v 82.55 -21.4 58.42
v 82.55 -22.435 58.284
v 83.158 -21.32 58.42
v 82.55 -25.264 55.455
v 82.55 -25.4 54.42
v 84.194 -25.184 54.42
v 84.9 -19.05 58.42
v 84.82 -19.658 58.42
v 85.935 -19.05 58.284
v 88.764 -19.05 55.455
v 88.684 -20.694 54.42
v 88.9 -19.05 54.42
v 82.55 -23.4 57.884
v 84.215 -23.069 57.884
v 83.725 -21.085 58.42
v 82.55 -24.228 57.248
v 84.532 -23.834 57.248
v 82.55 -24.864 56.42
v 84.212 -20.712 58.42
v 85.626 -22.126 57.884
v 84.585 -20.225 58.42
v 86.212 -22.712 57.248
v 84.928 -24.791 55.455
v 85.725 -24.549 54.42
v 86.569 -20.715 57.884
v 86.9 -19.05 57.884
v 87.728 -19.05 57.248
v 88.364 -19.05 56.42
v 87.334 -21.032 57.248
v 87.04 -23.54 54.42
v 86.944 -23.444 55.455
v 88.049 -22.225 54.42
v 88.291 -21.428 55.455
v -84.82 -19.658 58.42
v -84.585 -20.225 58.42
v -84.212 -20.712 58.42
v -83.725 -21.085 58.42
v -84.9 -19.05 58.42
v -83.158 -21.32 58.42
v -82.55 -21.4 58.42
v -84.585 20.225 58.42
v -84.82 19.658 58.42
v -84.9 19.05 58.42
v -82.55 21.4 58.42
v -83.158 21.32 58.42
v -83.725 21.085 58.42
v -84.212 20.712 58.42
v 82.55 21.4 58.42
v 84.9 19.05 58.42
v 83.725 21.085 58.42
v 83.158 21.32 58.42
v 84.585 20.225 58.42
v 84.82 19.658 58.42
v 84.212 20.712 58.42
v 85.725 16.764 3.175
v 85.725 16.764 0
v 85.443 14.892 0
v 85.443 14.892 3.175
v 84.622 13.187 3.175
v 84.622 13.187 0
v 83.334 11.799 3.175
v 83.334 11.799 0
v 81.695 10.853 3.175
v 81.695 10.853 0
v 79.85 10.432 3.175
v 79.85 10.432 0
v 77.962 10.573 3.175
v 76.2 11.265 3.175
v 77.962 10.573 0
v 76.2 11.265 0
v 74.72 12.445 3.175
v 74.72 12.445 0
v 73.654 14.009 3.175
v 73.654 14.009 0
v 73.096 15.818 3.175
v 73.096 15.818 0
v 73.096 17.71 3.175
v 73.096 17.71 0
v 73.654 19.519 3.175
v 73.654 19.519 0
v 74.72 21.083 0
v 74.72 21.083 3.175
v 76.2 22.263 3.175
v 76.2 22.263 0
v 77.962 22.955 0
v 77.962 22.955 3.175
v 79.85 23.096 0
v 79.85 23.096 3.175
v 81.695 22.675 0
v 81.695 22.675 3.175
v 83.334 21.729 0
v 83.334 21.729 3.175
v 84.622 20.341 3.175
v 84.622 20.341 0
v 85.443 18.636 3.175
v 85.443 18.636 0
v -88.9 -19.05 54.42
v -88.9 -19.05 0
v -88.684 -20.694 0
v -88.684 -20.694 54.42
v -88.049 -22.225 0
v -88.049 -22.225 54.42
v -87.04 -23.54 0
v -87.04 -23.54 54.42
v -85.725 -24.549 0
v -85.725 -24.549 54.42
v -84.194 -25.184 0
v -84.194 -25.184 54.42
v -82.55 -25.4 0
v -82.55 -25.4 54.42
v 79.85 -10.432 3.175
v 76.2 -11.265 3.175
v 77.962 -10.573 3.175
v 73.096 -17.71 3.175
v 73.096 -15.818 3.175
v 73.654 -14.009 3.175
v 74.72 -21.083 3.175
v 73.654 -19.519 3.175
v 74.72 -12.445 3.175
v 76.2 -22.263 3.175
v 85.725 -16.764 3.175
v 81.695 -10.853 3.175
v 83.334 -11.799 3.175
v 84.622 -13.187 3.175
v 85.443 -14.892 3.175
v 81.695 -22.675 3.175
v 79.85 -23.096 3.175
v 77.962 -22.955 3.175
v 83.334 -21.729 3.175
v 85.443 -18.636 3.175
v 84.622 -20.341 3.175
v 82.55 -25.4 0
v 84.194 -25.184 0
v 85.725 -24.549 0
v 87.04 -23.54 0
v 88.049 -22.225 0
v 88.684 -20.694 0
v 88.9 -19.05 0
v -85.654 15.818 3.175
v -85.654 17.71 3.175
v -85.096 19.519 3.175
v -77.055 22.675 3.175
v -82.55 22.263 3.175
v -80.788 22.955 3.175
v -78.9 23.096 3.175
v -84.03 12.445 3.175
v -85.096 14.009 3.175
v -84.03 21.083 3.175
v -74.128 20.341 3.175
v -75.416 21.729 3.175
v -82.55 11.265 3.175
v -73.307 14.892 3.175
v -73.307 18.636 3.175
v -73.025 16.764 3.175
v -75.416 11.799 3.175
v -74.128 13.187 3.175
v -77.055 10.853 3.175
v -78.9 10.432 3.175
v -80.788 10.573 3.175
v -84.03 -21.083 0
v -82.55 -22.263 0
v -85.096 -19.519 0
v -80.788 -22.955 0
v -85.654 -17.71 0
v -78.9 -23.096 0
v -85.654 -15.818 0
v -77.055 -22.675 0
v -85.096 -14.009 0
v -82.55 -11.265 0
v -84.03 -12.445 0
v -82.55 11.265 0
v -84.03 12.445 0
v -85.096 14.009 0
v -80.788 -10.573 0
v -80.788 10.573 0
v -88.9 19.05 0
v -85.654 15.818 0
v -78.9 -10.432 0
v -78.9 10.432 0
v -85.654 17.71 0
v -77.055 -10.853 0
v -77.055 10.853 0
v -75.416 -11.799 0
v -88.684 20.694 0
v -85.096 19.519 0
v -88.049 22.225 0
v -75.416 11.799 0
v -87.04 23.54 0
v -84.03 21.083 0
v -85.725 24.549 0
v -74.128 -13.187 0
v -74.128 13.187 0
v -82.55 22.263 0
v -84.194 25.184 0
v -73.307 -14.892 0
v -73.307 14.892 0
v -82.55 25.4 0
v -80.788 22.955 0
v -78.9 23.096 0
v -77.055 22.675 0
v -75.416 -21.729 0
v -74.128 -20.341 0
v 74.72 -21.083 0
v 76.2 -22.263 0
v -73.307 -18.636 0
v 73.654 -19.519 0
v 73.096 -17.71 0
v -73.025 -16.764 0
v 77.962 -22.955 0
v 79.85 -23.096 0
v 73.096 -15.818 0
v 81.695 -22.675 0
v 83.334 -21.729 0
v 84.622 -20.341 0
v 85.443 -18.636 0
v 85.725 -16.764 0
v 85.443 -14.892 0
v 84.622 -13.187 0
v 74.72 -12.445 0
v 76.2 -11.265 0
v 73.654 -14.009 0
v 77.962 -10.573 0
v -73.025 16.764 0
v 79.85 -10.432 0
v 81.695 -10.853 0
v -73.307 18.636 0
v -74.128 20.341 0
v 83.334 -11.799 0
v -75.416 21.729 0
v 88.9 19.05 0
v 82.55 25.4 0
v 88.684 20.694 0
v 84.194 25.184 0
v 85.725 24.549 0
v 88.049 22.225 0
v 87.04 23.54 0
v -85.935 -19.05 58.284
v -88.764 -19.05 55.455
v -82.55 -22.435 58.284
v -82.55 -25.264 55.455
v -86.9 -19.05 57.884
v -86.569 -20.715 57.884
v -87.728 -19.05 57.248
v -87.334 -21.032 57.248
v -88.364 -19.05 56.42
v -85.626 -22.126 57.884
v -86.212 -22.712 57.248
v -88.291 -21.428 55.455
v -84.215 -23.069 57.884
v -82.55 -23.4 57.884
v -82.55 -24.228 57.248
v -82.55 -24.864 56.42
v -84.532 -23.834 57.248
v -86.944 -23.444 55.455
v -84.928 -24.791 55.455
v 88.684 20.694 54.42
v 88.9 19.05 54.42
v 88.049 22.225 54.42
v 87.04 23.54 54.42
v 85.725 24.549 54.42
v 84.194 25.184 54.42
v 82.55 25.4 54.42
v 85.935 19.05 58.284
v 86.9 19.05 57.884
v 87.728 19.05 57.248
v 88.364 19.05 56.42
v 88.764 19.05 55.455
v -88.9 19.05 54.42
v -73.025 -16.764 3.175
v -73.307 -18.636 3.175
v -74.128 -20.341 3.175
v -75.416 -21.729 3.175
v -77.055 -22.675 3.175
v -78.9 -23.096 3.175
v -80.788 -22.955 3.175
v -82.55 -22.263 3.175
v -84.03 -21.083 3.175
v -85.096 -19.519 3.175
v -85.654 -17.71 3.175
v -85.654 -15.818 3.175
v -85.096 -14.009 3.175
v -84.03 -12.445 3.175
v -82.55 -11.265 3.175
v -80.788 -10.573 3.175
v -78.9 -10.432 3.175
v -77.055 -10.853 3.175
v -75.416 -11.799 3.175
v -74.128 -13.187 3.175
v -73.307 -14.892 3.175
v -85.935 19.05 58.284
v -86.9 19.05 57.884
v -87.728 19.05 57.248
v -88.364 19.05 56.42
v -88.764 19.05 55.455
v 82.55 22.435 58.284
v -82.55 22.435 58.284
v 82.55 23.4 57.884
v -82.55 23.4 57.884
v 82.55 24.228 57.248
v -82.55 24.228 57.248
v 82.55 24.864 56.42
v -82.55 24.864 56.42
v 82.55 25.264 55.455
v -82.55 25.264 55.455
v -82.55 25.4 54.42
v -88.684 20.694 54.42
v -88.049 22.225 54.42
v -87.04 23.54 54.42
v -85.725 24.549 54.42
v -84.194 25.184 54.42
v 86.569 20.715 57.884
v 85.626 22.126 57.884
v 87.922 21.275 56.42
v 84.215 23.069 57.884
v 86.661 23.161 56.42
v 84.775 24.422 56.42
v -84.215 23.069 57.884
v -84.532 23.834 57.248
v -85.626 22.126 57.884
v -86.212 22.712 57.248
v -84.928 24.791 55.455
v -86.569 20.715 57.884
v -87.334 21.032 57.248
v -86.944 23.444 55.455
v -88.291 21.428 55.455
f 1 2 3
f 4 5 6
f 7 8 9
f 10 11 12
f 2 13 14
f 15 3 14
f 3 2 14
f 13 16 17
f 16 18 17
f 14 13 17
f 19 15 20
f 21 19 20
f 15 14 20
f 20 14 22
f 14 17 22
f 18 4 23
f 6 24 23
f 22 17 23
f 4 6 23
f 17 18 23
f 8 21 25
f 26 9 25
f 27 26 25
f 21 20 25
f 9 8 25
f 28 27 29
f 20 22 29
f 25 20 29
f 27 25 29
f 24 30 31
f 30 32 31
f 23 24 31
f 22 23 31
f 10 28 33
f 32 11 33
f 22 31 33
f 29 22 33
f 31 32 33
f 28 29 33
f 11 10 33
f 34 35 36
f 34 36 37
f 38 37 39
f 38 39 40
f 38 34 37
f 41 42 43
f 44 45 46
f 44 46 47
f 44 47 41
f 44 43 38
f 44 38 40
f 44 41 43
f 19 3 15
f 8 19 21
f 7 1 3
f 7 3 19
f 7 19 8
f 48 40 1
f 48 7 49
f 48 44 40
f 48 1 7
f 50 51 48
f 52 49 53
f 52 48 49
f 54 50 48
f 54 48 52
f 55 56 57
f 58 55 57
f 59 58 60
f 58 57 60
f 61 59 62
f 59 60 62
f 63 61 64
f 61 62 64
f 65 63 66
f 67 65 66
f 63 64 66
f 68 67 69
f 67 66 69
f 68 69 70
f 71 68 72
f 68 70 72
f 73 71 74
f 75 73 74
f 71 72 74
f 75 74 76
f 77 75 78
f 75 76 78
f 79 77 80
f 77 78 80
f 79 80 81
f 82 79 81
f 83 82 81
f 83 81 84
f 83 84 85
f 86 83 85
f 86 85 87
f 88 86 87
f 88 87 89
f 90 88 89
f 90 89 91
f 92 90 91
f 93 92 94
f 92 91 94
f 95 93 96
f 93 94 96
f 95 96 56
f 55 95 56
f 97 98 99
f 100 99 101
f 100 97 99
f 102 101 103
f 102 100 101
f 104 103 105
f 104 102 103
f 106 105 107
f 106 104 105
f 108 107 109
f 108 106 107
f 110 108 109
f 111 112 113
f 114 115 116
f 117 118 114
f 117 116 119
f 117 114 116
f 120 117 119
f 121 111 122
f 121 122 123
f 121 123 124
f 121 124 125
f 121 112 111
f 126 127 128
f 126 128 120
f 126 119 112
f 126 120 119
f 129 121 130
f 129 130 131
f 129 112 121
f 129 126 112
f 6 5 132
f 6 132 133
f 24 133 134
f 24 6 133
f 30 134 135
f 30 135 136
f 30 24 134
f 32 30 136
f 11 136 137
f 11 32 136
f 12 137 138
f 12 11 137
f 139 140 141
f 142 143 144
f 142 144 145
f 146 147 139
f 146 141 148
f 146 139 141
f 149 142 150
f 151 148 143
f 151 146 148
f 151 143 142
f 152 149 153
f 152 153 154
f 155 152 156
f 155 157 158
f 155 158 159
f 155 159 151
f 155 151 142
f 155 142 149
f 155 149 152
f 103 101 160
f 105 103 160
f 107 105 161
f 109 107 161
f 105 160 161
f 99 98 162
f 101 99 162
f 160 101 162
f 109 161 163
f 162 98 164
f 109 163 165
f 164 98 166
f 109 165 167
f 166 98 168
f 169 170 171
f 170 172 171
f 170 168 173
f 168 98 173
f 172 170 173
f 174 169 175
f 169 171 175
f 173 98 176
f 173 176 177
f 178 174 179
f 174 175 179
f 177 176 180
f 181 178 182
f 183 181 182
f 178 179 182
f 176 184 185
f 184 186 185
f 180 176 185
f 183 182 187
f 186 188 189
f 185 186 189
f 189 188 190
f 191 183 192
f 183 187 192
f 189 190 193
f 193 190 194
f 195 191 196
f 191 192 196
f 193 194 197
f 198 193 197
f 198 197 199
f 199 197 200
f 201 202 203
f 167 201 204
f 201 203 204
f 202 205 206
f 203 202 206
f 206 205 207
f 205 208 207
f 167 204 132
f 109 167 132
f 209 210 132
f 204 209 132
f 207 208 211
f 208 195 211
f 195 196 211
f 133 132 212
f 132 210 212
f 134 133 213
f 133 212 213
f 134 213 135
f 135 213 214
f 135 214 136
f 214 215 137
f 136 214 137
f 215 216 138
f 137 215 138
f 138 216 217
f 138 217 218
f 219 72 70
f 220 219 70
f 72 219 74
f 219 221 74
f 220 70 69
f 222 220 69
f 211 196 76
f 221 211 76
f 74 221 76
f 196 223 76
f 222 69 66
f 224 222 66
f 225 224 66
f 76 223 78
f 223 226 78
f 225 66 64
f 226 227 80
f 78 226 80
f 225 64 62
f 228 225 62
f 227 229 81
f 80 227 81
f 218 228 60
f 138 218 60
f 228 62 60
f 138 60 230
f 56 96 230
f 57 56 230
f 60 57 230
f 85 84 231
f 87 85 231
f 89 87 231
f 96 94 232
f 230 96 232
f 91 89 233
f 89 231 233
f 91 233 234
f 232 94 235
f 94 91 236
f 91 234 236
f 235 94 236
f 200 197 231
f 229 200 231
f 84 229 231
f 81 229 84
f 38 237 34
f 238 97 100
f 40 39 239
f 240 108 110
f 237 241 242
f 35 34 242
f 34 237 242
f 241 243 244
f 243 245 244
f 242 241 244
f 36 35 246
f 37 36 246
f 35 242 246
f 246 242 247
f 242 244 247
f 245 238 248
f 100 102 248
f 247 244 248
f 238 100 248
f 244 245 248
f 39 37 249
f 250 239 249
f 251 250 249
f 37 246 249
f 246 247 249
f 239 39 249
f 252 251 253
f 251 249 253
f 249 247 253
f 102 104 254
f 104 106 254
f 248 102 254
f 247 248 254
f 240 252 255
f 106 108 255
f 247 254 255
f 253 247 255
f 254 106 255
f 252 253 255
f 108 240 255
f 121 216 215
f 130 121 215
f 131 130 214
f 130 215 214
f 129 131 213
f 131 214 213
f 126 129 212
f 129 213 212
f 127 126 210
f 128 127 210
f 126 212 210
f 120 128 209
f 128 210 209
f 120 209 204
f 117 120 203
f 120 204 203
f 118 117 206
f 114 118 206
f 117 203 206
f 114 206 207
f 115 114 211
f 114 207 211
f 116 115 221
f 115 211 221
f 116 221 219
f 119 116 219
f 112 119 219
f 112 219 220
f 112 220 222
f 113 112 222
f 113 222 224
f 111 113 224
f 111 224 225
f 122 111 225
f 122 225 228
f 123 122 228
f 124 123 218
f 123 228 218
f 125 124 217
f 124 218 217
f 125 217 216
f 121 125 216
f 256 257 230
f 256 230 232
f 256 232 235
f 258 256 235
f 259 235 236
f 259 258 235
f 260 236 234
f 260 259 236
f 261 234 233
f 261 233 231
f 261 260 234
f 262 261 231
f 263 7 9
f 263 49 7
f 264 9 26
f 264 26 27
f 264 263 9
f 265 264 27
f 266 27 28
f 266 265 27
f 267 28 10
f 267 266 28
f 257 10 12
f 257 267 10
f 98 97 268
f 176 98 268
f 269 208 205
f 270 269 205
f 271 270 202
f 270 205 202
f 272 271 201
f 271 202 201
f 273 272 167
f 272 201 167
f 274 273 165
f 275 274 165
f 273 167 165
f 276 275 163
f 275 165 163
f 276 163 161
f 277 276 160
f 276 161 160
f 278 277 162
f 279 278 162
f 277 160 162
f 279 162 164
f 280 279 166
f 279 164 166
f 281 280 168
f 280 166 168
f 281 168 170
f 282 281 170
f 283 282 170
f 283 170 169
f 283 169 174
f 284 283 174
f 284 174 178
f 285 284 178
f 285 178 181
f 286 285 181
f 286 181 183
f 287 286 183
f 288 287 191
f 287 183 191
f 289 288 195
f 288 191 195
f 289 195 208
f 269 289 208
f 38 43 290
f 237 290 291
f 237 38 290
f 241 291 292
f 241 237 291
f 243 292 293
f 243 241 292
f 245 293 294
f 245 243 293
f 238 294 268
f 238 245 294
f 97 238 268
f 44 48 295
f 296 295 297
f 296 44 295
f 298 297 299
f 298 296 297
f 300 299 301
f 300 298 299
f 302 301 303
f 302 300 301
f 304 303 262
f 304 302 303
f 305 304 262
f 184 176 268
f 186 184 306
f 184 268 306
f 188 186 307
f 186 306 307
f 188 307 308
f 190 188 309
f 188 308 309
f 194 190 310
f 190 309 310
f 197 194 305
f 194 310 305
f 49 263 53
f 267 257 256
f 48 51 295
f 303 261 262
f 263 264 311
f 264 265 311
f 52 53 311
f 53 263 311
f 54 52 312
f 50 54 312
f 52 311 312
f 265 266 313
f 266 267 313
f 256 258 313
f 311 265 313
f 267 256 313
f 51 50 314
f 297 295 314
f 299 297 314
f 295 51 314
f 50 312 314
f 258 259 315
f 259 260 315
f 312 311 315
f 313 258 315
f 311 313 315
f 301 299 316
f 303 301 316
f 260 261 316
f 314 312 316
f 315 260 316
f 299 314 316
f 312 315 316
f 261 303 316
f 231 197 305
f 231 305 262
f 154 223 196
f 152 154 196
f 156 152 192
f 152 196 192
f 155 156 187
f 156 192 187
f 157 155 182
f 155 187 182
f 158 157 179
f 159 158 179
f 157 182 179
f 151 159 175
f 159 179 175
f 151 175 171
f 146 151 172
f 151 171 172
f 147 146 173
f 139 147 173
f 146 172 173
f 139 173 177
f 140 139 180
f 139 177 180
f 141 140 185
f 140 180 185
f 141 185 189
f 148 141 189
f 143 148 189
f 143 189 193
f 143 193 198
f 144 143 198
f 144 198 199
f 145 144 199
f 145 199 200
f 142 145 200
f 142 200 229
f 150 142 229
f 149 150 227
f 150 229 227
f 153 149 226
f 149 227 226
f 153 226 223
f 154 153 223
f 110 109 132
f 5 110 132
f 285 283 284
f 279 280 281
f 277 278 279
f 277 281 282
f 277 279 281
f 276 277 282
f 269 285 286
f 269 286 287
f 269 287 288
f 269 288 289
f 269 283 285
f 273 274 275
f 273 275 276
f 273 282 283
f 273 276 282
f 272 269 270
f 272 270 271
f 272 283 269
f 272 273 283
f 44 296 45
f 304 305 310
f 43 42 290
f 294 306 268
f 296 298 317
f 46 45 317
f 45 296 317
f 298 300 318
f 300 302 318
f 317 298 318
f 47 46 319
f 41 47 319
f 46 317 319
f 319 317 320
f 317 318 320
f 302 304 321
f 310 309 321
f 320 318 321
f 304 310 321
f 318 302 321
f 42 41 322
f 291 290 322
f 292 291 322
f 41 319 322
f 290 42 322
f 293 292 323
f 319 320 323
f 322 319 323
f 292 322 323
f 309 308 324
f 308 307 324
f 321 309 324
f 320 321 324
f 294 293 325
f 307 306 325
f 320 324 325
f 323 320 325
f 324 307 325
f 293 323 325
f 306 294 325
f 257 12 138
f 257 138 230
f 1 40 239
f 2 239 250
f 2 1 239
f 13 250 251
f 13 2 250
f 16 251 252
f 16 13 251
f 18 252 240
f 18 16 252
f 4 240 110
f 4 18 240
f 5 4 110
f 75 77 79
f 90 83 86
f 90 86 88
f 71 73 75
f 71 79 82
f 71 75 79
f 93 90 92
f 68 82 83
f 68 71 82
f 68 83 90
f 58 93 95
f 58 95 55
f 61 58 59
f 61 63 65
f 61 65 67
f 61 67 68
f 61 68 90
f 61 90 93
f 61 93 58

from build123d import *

# Parameters (mm, degrees)
F0_W     = 177.8
F0_H     = 50.8
F1_DEPTH = 58.42
F2_R     = 6.35
F3_R     = 6.35
F4_DEPTH = 3.175
F6_R     = 4


with BuildPart() as f1:
    # F0 (on Top) → F1 (new body)
    with BuildSketch(Plane.XY):
        Rectangle(F0_W, F0_H)
    extrude(amount=F1_DEPTH)

    # F2
    f2_edges = [f1.edges().sort_by_distance(p)[0] for p in [
        (-88.9, 25.4, 29.21),
        (88.9, 25.4, 29.21),
        (88.9, -25.4, 29.21),
        (-88.9, -25.4, 29.21),
    ]]
    fillet(f2_edges, radius=F2_R)

    # F3 (on face) → F4 (cut)
    with BuildSketch(Plane(origin=(0, 0, 0), x_dir=(1, 0, 0), z_dir=(0, 0, -1))):
        with Locations((79.375, 16.764)):
            Circle(F3_R)
        with Locations((79.375, -16.764)):
            Circle(F3_R)
        with Locations((-79.375, 16.764)):
            Circle(F3_R)
        with Locations((-79.375, -16.764)):
            Circle(F3_R)
    extrude(amount=-F4_DEPTH, mode=Mode.SUBTRACT)

    # F6
    f6_edges = [f1.edges().sort_by_distance(p)[0] for p in [
        (87.040128, 23.540128, 58.42),
        (88.9, 0, 58.42),
        (87.040128, -23.540128, 58.42),
        (0, -25.4, 58.42),
        (0, 25.4, 58.42),
        (-88.9, 0, 58.42),
        (-87.040128, 23.540128, 58.42),
        (-87.040128, -23.540128, 58.42),
    ]]
    fillet(f6_edges, radius=F6_R)


solid = f1.part
